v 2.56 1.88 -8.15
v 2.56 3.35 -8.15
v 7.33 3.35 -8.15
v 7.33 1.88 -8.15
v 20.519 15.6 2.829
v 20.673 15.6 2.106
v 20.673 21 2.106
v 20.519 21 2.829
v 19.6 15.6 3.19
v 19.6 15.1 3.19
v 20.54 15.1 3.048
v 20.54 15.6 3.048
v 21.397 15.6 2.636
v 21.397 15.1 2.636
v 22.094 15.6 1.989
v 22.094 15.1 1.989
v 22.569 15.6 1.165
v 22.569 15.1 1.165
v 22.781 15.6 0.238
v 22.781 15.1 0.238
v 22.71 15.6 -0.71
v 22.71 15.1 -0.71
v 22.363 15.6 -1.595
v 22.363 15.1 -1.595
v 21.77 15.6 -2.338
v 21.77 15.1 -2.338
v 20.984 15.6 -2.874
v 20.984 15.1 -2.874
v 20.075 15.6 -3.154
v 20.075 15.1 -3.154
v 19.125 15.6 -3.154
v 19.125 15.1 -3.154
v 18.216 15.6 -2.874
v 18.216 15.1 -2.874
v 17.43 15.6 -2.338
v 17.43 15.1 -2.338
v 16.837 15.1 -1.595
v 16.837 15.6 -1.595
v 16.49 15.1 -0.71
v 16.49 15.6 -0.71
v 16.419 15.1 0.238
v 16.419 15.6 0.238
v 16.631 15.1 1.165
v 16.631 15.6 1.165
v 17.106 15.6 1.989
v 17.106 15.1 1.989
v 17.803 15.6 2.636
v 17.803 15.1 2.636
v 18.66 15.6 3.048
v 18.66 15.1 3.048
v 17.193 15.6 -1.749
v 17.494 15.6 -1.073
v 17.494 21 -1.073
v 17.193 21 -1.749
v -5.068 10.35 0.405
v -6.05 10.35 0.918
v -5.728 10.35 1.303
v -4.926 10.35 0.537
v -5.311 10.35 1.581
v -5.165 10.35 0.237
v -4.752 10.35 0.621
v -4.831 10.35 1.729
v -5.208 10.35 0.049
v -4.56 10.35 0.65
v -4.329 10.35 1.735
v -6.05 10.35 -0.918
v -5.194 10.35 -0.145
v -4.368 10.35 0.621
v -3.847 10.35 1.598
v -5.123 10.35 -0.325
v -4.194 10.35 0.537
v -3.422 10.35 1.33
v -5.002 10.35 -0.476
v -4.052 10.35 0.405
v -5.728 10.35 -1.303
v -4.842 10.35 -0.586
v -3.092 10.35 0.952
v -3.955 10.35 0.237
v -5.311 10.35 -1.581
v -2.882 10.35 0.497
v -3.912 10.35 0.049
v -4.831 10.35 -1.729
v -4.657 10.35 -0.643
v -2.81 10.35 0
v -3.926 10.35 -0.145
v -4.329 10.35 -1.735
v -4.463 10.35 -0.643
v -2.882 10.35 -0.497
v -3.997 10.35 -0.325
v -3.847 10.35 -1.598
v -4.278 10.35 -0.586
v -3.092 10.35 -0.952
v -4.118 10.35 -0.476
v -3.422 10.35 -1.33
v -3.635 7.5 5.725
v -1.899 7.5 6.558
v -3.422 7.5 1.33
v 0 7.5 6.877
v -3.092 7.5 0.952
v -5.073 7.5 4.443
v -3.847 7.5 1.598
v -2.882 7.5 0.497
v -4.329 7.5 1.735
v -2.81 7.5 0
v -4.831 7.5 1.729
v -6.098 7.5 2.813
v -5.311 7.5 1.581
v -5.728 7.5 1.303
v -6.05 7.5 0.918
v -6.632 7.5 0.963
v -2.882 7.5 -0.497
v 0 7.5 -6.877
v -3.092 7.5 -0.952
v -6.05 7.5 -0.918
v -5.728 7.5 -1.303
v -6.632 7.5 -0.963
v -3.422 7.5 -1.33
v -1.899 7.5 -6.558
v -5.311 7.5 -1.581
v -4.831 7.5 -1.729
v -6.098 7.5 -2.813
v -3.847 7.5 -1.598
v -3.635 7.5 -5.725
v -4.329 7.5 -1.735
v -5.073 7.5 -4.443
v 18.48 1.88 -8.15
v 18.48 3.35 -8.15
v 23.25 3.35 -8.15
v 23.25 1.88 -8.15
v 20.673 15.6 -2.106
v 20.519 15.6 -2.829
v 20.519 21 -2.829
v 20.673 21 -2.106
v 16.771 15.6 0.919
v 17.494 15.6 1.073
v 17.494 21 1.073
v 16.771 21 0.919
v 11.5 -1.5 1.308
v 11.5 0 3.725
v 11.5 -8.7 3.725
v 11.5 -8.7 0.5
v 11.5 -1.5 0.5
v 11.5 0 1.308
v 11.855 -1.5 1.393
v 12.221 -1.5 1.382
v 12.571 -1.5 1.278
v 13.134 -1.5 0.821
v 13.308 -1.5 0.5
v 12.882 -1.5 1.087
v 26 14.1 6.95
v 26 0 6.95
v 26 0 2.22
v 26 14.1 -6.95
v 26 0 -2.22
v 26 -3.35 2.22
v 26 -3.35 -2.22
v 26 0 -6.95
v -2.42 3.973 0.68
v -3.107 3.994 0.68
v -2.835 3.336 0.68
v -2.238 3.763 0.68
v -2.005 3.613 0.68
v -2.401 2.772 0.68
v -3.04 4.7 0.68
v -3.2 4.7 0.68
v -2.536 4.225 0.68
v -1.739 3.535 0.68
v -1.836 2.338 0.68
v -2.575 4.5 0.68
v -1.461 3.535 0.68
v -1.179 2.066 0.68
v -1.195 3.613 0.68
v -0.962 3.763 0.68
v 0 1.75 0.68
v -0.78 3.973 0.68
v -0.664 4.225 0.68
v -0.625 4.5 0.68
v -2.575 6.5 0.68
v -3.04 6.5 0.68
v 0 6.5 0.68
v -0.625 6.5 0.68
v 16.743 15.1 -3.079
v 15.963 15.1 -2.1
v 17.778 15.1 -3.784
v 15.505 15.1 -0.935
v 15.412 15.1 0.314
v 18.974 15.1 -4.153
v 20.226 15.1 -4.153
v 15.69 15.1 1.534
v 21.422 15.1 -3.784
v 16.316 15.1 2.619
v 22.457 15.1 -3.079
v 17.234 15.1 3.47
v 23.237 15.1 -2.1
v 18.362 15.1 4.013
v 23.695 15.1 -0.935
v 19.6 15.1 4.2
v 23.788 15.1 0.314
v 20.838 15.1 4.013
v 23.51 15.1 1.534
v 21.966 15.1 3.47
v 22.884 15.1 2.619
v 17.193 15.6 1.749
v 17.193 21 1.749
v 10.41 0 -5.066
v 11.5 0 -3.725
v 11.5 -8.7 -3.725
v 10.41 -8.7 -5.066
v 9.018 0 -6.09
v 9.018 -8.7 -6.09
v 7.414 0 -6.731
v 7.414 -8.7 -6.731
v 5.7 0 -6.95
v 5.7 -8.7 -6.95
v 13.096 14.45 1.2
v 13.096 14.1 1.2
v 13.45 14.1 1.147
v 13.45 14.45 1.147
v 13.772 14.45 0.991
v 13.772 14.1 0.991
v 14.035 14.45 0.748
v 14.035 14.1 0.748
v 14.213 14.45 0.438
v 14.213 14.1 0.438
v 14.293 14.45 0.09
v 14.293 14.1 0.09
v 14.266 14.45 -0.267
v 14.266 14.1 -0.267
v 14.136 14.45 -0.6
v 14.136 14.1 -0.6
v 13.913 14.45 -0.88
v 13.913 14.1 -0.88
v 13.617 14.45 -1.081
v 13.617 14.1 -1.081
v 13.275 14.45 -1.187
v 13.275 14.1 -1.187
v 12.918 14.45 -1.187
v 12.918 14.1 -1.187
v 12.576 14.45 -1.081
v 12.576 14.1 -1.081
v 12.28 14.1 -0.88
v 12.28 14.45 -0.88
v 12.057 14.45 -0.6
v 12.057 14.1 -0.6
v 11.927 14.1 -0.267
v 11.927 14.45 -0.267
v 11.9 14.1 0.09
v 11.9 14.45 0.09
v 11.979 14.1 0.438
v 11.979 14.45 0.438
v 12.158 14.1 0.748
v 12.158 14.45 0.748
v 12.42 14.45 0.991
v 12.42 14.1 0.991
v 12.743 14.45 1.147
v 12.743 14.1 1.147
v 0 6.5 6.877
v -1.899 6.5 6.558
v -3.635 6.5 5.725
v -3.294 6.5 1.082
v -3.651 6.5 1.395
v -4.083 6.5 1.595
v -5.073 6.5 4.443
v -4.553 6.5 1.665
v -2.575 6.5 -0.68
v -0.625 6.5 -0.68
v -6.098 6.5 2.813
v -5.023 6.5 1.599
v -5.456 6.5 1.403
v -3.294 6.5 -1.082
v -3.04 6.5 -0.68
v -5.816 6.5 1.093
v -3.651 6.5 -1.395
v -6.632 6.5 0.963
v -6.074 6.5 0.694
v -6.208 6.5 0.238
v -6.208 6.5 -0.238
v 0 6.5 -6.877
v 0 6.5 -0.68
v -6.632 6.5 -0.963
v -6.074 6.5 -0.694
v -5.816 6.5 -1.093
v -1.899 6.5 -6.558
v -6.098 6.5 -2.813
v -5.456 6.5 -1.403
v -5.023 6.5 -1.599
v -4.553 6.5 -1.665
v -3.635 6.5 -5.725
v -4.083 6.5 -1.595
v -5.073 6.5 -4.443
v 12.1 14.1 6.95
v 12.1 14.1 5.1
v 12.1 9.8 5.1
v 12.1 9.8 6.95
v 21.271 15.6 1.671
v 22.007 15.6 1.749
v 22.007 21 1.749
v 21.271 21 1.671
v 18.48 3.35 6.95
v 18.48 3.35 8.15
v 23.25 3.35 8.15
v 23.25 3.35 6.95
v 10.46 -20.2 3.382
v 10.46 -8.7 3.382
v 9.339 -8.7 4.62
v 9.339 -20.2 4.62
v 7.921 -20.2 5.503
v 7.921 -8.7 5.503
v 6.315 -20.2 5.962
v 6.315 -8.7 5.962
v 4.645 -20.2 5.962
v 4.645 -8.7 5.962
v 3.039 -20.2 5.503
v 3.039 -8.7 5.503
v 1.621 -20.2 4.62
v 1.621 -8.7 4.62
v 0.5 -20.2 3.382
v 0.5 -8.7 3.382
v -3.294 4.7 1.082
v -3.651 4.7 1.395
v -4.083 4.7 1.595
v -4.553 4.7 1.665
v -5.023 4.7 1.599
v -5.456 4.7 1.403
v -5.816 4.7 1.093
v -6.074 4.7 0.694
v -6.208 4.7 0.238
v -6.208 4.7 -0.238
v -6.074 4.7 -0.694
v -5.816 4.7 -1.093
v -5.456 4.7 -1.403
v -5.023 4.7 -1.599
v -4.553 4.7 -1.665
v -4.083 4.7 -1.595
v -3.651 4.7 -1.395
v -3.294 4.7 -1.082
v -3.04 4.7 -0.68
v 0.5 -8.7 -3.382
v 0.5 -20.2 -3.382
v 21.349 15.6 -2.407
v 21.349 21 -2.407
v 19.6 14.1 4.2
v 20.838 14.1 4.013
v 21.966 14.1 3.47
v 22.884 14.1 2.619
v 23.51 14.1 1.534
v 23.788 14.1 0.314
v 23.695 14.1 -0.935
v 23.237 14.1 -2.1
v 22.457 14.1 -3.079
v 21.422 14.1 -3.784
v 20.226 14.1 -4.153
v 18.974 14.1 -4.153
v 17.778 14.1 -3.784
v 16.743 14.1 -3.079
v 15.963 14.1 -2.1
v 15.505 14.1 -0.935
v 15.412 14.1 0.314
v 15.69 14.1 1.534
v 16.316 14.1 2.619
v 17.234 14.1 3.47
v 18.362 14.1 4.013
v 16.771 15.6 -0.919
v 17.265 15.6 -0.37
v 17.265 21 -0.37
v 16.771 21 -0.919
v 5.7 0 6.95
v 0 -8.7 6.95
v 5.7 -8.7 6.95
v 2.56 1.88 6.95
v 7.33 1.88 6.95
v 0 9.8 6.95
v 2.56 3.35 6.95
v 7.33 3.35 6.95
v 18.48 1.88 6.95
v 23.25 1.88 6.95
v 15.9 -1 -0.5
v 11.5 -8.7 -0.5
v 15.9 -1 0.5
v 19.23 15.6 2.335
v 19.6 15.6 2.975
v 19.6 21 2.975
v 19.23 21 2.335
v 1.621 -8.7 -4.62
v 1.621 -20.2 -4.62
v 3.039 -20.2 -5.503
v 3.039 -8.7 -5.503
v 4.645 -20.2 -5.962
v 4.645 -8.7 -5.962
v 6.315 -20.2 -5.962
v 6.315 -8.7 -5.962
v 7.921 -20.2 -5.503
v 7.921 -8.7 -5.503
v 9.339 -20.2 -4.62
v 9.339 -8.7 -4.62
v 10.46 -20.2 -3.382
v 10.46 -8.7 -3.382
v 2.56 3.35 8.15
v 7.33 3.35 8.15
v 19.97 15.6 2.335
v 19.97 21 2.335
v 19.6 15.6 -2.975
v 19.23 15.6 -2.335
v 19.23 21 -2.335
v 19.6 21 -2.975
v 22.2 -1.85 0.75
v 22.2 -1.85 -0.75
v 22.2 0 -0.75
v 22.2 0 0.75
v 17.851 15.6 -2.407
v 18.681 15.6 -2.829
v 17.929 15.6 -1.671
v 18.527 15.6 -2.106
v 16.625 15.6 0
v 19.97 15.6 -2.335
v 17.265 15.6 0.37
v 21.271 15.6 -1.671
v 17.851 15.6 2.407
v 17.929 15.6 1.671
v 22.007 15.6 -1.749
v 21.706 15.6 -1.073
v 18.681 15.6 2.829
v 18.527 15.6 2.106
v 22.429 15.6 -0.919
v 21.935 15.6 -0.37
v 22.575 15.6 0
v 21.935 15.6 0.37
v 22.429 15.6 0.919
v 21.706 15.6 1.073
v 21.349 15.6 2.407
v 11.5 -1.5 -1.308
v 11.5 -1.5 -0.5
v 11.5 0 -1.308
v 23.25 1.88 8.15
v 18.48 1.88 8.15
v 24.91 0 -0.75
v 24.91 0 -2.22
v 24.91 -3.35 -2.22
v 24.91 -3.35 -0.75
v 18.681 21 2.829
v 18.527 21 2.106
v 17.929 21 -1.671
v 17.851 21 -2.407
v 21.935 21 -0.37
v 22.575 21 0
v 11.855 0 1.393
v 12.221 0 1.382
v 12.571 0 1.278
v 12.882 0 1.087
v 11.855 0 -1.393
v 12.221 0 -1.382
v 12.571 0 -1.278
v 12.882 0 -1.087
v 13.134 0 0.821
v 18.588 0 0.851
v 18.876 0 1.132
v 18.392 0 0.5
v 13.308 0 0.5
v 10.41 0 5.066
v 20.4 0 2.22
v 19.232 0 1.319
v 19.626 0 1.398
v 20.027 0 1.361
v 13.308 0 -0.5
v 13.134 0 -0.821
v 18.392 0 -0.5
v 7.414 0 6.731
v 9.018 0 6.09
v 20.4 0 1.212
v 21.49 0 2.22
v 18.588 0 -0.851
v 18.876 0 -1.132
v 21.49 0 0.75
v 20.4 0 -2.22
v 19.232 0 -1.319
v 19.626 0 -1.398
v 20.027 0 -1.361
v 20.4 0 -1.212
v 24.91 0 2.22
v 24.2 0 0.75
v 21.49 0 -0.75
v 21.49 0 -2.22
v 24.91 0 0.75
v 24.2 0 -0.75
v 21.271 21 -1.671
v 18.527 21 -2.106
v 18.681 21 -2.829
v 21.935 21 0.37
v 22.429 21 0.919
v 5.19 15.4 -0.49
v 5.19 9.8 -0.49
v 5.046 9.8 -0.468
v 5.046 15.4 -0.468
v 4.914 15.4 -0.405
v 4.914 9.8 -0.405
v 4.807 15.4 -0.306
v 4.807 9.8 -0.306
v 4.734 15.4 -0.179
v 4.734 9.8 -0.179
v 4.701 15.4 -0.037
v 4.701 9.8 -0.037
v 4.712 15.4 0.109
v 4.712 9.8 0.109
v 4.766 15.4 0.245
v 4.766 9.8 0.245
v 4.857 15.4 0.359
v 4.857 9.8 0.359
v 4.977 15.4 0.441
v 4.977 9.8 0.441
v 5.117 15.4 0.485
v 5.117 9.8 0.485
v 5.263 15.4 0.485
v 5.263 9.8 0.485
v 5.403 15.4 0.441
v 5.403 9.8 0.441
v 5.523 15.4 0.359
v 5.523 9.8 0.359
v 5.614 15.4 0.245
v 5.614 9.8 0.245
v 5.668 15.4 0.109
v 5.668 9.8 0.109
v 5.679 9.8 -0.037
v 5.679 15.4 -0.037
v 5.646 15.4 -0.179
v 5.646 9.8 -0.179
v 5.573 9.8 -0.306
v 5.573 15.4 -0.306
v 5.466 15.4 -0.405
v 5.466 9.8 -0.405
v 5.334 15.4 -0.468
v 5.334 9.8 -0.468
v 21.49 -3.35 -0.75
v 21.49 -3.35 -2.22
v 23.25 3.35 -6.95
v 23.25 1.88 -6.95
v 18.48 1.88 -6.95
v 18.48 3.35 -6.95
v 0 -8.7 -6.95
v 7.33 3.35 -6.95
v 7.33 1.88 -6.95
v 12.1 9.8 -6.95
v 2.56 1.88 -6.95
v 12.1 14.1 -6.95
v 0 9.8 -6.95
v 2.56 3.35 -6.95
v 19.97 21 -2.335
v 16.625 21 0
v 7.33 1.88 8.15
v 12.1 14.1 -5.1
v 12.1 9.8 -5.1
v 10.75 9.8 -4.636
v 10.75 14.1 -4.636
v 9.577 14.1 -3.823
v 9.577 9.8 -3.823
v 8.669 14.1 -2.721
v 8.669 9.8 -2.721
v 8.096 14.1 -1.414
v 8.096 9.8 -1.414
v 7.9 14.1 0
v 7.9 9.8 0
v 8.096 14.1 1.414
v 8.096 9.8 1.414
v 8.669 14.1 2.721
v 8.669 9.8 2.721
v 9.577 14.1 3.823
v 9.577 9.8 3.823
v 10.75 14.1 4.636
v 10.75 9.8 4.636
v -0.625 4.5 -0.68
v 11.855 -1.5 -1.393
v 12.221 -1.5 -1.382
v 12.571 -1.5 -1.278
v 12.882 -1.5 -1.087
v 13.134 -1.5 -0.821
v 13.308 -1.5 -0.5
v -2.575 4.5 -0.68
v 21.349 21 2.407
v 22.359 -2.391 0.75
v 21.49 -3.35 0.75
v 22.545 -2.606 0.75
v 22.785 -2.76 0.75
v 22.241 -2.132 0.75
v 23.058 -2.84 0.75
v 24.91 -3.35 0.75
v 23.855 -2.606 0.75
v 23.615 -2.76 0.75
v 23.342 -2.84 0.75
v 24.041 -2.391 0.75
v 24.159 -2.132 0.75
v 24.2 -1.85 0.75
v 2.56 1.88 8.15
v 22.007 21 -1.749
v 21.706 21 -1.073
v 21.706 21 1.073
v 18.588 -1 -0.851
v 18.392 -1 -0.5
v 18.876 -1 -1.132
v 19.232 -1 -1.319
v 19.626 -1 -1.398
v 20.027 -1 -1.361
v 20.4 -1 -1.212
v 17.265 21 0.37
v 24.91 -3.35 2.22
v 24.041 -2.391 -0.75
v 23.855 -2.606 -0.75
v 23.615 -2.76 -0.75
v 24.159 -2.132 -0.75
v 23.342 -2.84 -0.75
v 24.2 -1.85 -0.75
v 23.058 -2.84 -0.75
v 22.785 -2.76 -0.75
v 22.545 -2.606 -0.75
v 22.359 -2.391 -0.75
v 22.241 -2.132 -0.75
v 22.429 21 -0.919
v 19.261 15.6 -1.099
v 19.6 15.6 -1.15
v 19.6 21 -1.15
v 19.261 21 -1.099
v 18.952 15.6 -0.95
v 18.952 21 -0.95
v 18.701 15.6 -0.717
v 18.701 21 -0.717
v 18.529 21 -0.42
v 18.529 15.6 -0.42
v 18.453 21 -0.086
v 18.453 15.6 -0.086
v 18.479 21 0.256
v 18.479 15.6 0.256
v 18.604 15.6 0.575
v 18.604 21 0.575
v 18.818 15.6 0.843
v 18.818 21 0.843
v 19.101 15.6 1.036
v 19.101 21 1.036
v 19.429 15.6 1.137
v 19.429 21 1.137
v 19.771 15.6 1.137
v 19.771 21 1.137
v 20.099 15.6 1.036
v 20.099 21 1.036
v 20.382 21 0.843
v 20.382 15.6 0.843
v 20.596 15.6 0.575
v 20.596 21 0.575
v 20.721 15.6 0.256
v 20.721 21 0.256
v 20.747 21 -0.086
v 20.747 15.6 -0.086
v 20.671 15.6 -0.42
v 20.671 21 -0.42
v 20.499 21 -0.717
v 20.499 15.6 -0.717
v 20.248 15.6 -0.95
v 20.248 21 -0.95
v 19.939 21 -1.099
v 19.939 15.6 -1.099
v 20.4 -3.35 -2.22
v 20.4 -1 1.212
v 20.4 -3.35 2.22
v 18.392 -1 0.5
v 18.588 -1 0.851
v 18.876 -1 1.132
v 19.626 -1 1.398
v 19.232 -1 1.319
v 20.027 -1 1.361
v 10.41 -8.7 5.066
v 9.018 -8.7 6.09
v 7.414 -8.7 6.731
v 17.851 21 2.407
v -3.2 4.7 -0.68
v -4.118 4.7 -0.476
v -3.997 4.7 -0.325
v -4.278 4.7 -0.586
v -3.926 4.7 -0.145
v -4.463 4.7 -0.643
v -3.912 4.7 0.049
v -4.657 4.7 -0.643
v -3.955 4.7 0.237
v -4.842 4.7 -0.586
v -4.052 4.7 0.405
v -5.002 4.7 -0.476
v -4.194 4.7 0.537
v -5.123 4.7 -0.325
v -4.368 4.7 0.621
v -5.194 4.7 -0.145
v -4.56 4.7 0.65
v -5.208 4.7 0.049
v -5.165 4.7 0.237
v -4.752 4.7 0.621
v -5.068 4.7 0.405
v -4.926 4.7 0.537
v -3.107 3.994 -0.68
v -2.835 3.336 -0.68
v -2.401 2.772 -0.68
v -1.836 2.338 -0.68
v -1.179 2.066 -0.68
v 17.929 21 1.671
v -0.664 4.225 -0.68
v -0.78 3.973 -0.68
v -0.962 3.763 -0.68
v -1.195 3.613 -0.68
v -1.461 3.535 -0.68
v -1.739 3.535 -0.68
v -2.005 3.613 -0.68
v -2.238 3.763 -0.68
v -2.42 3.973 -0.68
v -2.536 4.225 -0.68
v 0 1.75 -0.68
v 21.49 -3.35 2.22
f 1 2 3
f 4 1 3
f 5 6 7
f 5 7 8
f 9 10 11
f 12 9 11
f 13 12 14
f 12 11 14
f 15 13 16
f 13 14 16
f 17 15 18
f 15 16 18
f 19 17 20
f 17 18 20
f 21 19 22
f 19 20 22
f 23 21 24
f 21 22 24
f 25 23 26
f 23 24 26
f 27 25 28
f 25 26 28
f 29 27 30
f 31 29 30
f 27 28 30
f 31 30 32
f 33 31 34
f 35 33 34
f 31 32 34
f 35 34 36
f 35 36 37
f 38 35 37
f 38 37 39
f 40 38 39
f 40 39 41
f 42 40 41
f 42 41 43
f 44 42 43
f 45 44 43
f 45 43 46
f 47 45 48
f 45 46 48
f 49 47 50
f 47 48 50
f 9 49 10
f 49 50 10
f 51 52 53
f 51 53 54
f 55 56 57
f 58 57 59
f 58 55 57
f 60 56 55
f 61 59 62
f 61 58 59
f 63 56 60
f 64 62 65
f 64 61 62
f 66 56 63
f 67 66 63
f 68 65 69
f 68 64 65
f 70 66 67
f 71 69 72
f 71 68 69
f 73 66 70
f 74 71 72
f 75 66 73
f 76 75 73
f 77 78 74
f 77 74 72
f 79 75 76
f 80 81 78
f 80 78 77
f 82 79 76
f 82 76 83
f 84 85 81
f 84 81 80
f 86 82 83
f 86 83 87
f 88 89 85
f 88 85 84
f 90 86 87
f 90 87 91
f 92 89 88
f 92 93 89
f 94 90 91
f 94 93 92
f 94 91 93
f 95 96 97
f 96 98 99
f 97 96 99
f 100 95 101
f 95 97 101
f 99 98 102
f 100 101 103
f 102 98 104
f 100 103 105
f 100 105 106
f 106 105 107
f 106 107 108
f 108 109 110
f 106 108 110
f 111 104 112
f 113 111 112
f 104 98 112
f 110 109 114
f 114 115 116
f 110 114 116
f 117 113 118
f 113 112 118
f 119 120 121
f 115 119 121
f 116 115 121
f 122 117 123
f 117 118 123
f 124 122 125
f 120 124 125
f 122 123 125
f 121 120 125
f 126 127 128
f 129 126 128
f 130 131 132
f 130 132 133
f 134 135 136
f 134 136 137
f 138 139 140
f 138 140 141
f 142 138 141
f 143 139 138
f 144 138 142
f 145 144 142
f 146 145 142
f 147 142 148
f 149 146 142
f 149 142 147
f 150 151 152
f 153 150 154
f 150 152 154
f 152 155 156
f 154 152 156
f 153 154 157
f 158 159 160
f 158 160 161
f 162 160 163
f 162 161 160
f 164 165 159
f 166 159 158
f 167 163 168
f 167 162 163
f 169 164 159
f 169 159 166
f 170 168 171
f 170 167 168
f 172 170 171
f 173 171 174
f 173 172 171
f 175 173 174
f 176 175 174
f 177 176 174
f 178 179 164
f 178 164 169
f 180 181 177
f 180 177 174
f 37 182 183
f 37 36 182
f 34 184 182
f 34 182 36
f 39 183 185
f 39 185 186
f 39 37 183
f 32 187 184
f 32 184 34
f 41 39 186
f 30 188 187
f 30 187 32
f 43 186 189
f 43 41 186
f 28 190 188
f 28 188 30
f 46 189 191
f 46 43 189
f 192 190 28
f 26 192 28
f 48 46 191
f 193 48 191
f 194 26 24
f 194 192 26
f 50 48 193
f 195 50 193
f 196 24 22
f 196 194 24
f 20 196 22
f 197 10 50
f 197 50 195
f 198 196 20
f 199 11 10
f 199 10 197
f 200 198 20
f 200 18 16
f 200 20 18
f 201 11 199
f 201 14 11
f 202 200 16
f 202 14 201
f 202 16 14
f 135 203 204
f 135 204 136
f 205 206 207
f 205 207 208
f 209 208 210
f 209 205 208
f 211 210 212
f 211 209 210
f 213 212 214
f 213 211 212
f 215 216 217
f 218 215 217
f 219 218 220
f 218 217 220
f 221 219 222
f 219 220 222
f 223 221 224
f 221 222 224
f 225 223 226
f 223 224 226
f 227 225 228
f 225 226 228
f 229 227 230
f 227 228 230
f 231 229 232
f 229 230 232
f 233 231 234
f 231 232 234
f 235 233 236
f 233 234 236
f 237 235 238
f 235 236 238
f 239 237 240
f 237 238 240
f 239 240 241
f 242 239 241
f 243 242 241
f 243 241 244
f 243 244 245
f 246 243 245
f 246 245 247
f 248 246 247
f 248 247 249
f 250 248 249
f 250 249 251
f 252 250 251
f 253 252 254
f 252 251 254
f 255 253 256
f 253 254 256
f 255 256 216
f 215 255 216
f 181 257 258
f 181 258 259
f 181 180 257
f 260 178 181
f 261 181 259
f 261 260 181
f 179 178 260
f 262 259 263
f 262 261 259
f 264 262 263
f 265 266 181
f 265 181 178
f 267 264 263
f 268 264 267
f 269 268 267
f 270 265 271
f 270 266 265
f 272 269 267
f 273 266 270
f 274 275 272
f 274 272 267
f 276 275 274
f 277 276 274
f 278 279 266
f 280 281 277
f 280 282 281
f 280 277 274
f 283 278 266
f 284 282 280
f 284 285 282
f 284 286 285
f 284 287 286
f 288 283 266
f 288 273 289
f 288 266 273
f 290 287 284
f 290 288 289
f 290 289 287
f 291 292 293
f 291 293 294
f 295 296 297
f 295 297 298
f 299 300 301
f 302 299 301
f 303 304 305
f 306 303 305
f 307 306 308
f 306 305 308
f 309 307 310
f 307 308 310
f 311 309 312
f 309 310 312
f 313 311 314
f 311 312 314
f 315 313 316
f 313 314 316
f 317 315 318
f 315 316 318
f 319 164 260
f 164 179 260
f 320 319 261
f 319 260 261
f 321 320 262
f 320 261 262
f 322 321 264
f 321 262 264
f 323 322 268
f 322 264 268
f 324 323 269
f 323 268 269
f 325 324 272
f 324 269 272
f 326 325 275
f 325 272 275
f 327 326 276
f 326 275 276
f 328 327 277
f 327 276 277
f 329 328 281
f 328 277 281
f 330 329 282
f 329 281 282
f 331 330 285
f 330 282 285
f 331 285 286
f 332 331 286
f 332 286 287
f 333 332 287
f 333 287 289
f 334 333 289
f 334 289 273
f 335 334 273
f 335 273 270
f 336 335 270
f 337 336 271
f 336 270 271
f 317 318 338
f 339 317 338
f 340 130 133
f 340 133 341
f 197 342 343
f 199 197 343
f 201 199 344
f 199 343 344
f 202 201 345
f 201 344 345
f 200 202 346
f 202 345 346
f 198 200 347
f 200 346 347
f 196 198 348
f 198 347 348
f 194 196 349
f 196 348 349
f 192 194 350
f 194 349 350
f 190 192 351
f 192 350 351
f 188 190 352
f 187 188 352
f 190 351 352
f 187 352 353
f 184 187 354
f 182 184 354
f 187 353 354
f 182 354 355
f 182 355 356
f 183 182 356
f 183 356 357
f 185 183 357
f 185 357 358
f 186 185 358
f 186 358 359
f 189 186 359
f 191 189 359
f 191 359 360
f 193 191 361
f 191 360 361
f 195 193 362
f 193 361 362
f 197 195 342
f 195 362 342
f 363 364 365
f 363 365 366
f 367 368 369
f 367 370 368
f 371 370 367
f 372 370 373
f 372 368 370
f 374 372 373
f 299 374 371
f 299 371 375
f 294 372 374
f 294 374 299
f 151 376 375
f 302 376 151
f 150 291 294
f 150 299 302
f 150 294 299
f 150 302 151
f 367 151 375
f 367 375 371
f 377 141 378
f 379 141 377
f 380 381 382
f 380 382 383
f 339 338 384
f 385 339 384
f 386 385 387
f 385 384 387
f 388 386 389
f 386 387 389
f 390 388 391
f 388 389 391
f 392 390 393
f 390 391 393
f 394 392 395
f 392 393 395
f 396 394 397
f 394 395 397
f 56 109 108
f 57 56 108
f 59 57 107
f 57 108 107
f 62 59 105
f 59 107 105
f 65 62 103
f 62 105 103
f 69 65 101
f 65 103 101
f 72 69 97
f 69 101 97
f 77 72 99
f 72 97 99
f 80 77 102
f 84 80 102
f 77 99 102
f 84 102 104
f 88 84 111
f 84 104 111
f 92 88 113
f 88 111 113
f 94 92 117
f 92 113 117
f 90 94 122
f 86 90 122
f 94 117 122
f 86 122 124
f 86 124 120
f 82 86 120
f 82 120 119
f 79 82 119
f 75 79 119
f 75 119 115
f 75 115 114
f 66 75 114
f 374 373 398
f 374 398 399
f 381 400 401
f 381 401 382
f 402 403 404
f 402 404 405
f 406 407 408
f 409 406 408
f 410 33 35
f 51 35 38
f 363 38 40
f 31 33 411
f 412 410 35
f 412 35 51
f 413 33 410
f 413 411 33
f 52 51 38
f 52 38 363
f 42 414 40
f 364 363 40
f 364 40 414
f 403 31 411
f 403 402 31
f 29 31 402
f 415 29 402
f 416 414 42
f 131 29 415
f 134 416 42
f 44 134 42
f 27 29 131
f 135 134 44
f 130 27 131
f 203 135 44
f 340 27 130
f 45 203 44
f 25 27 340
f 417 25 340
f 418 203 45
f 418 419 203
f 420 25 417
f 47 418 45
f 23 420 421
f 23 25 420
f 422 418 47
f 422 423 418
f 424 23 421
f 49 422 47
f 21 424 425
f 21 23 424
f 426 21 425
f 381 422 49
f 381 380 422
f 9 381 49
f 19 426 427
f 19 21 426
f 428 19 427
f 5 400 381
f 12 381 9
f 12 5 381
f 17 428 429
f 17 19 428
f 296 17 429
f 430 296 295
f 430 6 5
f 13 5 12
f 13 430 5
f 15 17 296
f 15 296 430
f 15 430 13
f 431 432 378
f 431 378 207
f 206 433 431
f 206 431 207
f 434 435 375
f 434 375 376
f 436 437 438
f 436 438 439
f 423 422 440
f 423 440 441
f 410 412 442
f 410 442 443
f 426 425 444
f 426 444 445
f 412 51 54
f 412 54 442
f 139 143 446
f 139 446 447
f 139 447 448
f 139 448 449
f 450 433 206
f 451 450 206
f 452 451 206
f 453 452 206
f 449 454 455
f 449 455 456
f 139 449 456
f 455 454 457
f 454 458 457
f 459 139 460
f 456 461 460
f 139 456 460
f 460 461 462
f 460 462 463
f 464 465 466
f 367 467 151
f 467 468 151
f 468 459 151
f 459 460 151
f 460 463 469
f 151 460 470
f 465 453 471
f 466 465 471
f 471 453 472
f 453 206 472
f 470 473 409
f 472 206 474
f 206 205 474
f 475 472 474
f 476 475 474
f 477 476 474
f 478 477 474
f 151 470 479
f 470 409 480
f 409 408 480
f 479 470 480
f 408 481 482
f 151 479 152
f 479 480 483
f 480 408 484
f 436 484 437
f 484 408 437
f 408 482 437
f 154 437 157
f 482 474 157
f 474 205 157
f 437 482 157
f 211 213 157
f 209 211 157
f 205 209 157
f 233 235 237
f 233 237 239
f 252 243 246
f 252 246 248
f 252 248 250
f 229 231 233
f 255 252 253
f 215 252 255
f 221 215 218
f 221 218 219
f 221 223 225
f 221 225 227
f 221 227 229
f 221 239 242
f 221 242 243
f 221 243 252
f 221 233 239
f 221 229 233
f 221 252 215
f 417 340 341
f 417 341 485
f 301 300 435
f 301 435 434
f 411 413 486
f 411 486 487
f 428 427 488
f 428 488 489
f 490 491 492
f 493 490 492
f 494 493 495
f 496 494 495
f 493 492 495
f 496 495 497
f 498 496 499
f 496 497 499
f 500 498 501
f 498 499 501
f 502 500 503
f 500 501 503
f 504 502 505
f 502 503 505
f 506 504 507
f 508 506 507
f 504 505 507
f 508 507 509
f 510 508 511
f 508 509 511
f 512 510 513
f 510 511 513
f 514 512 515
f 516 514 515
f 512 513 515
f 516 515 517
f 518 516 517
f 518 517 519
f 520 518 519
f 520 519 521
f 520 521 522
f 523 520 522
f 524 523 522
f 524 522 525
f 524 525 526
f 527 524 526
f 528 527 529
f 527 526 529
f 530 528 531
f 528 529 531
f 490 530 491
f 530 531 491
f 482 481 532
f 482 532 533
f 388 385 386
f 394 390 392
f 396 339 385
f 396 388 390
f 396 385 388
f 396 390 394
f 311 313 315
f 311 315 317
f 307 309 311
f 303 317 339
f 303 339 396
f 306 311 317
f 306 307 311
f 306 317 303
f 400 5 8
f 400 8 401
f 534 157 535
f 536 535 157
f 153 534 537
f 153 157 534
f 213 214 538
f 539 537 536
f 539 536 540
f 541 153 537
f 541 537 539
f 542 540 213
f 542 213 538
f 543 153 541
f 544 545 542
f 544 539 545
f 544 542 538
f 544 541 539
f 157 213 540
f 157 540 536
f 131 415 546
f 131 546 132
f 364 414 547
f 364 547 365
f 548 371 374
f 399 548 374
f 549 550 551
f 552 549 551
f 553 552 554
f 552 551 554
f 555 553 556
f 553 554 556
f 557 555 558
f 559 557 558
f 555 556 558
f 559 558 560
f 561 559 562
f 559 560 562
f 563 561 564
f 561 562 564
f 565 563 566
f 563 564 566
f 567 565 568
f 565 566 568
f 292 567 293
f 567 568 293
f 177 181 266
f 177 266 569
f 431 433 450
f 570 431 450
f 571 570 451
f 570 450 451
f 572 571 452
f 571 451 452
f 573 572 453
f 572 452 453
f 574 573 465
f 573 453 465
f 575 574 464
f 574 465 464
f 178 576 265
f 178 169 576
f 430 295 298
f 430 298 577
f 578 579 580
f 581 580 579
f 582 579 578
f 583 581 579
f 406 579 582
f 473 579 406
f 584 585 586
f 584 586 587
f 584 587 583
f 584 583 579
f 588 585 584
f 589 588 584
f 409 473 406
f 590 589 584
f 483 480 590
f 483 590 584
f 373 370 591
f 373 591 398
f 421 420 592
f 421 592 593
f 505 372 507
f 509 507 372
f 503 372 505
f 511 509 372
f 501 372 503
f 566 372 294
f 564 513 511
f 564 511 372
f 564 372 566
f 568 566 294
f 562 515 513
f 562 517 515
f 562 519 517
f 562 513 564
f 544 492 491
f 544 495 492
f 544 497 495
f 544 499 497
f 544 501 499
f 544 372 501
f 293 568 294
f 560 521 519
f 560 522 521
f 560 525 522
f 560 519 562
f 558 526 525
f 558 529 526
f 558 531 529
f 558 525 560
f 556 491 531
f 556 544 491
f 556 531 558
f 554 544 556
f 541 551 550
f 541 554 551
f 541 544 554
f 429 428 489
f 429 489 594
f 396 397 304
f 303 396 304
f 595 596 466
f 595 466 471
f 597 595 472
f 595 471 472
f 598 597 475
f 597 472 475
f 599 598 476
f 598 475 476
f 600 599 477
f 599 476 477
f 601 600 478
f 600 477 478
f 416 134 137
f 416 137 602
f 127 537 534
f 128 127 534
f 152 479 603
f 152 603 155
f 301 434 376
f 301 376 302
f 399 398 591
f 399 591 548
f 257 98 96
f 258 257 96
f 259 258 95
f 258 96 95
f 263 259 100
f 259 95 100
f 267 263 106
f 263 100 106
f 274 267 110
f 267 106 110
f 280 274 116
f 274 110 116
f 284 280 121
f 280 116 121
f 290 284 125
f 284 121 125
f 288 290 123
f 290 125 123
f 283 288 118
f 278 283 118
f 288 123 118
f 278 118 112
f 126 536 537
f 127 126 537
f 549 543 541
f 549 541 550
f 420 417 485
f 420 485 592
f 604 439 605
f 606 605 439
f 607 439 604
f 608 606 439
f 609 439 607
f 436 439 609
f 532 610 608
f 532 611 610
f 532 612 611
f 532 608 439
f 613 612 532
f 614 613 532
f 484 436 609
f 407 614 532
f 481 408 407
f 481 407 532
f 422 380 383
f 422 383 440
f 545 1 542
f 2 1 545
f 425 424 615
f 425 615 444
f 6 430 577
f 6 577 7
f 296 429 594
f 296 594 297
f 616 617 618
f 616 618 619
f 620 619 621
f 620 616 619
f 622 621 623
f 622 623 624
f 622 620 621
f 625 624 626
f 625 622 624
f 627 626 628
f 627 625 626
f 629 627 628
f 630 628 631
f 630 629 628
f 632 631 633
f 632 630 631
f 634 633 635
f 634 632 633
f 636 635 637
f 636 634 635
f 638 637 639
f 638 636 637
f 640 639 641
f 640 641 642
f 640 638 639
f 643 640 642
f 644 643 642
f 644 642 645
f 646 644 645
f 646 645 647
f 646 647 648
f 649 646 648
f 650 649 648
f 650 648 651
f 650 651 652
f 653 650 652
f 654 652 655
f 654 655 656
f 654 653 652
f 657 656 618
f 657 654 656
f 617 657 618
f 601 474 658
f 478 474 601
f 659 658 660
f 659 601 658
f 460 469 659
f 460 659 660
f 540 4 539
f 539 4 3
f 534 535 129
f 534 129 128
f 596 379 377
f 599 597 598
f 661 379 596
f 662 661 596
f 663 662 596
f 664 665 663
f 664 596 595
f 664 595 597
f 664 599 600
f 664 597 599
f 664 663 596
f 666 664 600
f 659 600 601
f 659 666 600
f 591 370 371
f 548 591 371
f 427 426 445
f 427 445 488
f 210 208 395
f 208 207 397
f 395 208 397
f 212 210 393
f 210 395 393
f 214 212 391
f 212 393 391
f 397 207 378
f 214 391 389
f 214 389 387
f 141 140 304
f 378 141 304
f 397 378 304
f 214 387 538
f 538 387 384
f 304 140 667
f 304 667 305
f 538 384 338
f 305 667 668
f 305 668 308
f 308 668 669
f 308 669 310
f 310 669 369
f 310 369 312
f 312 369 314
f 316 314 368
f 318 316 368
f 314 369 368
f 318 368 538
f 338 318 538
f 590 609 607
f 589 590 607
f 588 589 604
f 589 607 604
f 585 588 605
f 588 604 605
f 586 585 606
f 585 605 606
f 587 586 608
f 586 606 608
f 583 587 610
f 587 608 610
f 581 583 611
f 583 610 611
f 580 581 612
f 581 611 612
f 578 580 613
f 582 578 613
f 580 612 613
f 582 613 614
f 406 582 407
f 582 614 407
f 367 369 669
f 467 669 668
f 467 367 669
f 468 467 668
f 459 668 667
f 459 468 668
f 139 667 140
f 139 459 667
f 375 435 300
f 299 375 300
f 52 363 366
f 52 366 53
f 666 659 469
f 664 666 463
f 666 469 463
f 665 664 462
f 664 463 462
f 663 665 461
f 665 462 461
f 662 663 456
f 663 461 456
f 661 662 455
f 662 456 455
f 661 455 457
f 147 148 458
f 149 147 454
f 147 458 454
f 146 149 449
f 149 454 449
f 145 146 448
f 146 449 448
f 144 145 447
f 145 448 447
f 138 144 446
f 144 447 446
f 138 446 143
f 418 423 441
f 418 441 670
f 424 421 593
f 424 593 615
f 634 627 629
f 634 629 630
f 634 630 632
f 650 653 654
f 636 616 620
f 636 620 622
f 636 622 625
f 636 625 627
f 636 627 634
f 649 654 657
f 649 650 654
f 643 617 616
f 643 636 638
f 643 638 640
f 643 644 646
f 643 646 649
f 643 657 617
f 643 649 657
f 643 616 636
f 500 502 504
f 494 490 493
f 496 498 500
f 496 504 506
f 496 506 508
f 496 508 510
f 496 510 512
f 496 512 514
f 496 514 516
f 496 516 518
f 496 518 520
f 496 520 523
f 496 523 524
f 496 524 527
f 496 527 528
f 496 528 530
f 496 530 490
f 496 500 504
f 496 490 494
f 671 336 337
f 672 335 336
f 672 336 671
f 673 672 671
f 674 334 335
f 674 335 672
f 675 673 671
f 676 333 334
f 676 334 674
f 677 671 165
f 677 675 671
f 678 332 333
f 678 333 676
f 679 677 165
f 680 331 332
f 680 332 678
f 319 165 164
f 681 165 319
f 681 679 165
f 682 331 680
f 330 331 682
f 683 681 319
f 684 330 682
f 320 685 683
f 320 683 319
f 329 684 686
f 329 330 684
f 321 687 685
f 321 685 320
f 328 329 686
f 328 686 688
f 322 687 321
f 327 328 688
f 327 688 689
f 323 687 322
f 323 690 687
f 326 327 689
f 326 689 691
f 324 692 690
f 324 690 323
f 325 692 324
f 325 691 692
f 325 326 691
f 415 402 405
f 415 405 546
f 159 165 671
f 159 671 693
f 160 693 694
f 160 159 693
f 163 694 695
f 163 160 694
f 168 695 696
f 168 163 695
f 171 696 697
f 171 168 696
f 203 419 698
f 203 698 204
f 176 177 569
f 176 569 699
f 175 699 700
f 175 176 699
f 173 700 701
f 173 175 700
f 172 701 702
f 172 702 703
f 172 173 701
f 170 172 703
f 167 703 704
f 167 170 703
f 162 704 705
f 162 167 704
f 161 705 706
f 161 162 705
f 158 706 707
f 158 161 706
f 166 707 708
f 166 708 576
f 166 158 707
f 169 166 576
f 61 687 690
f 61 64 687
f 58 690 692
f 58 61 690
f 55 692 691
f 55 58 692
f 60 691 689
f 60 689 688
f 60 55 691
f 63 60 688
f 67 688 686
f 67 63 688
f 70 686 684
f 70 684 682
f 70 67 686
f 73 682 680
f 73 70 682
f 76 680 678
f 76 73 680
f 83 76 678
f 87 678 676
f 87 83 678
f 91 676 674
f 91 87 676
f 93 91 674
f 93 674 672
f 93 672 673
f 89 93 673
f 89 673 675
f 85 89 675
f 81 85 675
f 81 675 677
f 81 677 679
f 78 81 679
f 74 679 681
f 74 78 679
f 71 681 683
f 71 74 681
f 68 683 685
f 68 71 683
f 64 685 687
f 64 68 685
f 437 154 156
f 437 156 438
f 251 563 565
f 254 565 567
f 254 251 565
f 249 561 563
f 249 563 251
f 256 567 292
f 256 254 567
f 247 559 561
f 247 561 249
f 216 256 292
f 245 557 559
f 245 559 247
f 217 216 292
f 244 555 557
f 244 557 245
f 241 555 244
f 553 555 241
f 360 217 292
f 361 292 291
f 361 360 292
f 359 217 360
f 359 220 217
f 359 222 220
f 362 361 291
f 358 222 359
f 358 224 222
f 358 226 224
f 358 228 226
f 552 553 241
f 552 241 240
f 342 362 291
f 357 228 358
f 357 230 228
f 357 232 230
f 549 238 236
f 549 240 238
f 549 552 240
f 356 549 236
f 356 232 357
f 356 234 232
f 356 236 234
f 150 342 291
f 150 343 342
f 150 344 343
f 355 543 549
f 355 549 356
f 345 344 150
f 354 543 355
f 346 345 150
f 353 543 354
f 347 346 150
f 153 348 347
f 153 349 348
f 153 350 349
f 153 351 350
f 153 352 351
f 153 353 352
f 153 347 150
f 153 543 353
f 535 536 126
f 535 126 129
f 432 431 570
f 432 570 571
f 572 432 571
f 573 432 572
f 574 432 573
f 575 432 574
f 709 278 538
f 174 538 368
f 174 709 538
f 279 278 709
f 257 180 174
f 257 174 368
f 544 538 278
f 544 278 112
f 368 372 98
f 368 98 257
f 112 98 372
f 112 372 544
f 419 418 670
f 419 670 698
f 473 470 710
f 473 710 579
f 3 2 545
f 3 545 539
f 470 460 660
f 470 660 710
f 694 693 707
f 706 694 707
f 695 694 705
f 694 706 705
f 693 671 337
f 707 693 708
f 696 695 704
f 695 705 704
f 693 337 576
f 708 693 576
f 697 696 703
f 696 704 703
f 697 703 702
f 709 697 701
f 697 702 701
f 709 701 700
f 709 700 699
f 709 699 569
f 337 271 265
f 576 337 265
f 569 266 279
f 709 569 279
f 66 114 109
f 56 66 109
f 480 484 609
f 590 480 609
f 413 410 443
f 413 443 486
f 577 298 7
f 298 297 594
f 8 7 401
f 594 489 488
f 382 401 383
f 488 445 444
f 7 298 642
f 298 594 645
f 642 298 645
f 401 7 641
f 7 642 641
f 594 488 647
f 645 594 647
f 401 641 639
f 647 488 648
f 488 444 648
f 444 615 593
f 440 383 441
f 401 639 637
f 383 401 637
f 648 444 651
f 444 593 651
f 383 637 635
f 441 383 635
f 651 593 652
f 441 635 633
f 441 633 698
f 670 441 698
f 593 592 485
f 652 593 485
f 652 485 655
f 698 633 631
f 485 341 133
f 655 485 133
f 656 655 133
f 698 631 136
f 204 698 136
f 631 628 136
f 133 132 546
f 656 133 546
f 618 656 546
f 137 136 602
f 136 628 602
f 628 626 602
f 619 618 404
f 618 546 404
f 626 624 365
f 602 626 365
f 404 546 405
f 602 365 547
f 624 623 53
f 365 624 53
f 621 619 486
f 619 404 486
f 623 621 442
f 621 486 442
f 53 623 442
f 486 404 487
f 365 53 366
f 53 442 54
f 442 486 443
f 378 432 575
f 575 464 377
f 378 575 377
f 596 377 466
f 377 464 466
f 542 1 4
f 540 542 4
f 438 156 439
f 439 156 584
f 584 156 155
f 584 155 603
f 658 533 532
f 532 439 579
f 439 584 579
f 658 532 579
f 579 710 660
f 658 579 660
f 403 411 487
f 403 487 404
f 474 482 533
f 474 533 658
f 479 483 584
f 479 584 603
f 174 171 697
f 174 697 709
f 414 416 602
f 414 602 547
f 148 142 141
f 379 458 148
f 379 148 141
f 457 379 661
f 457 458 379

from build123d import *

# Parameters (mm, degrees)
SKETCH1_W            = 26
SKETCH1_H            = 13.9
BOSS_EXTRUDE1_DEPTH  = 9.8
BOSS_EXTRUDE2_DEPTH  = 4.3
SKETCH4_R            = 4.2
BOSS_EXTRUDE3_DEPTH  = 1
SKETCH5_R            = 3.19
BOSS_EXTRUDE4_DEPTH  = 0.5
SKETCH6_R            = 1.15
BOSS_EXTRUDE5_DEPTH  = 5.4
SKETCH7_R            = 0.49
BOSS_EXTRUDE6_DEPTH  = 5.6
BOSS_EXTRUDE7_DEPTH  = 8.7
BOSS_EXTRUDE8_DEPTH  = 11.5
BOSS_EXTRUDE9_DEPTH  = 3.35
CUT_EXTRUDE1_DEPTH   = 35.297084424
BOSS_EXTRUDE10_START = -2.3
BOSS_EXTRUDE10_DEPTH = 1
BOSS_EXTRUDE11_DEPTH = 2.85
SKETCH15_R           = 0.65
CUT_EXTRUDE2_DEPTH   = 41.713695484
SKETCH14_R           = 1.665
SKETCH14_R_2         = 0.65
BOSS_EXTRUDE12_DEPTH = 1.8
BOSS_EXTRUDE13_DEPTH = 0.68
BOSS_EXTRUDE14_DEPTH = 0.5
SKETCH18_R           = 1.2
BOSS_EXTRUDE15_DEPTH = 0.35
SKETCH20_W           = 4.77
SKETCH20_H           = 1.47
BOSS_EXTRUDE16_DEPTH = 8.15
SKETCH21_R           = 1.4
BOSS_EXTRUDE17_DEPTH = 1
BOSS_EXTRUDE18_START = -1
SKETCH22_R           = 1.4
BOSS_EXTRUDE18_DEPTH = 1.5


with BuildPart() as part:
    # Sketch1 → Boss-Extrude1 (new body)
    with BuildSketch(Plane(origin=(0, 0, 0), x_dir=(1, 0, 0), z_dir=(0, 1, 0))):
        with Locations((13, 0)):
            Rectangle(SKETCH1_W, SKETCH1_H)
    extrude(amount=BOSS_EXTRUDE1_DEPTH)

    # Sketch2 → Boss-Extrude2 (add)
    with BuildSketch(Plane(origin=(0, 9.8, 0), x_dir=(1, 0, 0), z_dir=(0, 1, 0))):
        with BuildLine():
            Line((26, -6.95), (26, 6.95))
            Line((26, 6.95), (12.1, 6.95))
            Line((12.1, 6.95), (12.1, 5.1))
            ThreePointArc((12.1, 5.1), (7.9, 0), (12.1, -5.1))
            Line((12.1, -5.1), (12.1, -6.95))
            Line((12.1, -6.95), (26, -6.95))
        make_face()
    extrude(amount=BOSS_EXTRUDE2_DEPTH)

    # Sketch4 → Boss-Extrude3 (add)
    with BuildSketch(Plane(origin=(0, 14.1, 0), x_dir=(1, 0, 0), z_dir=(0, 1, 0))):
        with Locations(Location((19.6, 0, 0), (0, 0, 270))):
            Circle(SKETCH4_R)
    extrude(amount=BOSS_EXTRUDE3_DEPTH)

    # Sketch5 → Boss-Extrude4 (add)
    with BuildSketch(Plane(origin=(0, 15.1, 0), x_dir=(1, 0, 0), z_dir=(0, 1, 0))):
        with Locations(Location((19.6, 0, 0), (0, 0, 270))):
            Circle(SKETCH5_R)
    extrude(amount=BOSS_EXTRUDE4_DEPTH)

    # Sketch6 → Boss-Extrude5 (add)
    with BuildSketch(Plane(origin=(0, 15.6, 0), x_dir=(1, 0, 0), z_dir=(0, 1, 0))):
        Polygon((18.680674442, 2.829393136), (19.230241972, 2.334560309), (19.6, 2.975), (19.969758028, 2.334560309), (20.519325558, 2.829393136), (20.673079592, 2.10603728), (21.348661126, 2.406825558), (21.271360649, 1.671360649), (22.006825558, 1.748661126), (21.70603728, 1.073079592), (22.429393136, 0.919325558), (21.934560309, 0.369758028), (22.575, 0), (21.934560309, -0.369758028), (22.429393136, -0.919325558), (21.70603728, -1.073079592), (22.006825558, -1.748661126), (21.271360649, -1.671360649), (21.348661126, -2.406825558), (20.673079592, -2.10603728), (20.519325558, -2.829393136), (19.969758028, -2.334560309), (19.6, -2.975), (19.230241972, -2.334560309), (18.680674442, -2.829393136), (18.526920408, -2.10603728), (17.851338874, -2.406825558), (17.928639351, -1.671360649), (17.193174442, -1.748661126), (17.49396272, -1.073079592), (16.770606864, -0.919325558), (17.265439691, -0.369758028), (16.625, 0), (17.265439691, 0.369758028), (16.770606864, 0.919325558), (17.49396272, 1.073079592), (17.193174442, 1.748661126), (17.928639351, 1.671360649), (17.851338874, 2.406825558), (18.526920408, 2.10603728), align=None)
        with Locations(Location((19.6, 0, 0), (0, 0, 90))):
            Circle(SKETCH6_R, mode=Mode.SUBTRACT)
    extrude(amount=BOSS_EXTRUDE5_DEPTH)

    # Sketch7 → Boss-Extrude6 (add)
    with BuildSketch(Plane(origin=(0, 9.8, 0), x_dir=(1, 0, 0), z_dir=(0, 1, 0))):
        with Locations(Location((5.19, 0, 0), (0, 0, 90))):
            Circle(SKETCH7_R)
    extrude(amount=BOSS_EXTRUDE6_DEPTH)

    # Sketch8 → Boss-Extrude7 (add)
    with BuildSketch(Plane.XZ):
        with BuildLine():
            Line((11.5, 3.725), (11.5, -3.725))
            ThreePointArc((11.5, -3.725), (9.018155549, -6.089531686), (5.7, -6.95))
            Line((5.7, -6.95), (0, -6.95))
            Line((0, -6.95), (0, 6.95))
            Line((0, 6.95), (5.7, 6.95))
            ThreePointArc((5.7, 6.95), (9.018155549, 6.089531686), (11.5, 3.725))
        make_face()
    extrude(amount=BOSS_EXTRUDE7_DEPTH)

    # Sketch9 → Boss-Extrude8 (add)
    with BuildSketch(Plane.XZ.offset(8.7)):
        with BuildLine():
            Line((0.5, 3.382306905), (0.5, -3.382306905))
            ThreePointArc((0.5, -3.382306905), (5.48, -6.02), (10.46, -3.382306905))
            Line((10.46, -3.382306905), (10.46, 3.382306905))
            ThreePointArc((10.46, 3.382306905), (5.48, 6.02), (0.5, 3.382306905))
        make_face()
    extrude(amount=BOSS_EXTRUDE8_DEPTH)

    # Sketch10 → Boss-Extrude9 (add)
    with BuildSketch(Plane.XZ):
        Polygon((26, 2.22), (26, -2.22), (24.91, -2.22), (24.91, -0.75), (21.49, -0.75), (21.49, -2.22), (20.4, -2.22), (20.4, 2.22), (21.49, 2.22), (21.49, 0.75), (24.91, 0.75), (24.91, 2.22), align=None)
    extrude(amount=BOSS_EXTRUDE9_DEPTH)

    # Sketch11 → Cut-Extrude1 (cut, through all)
    with BuildSketch(Plane(origin=(0, 0, -0.75), x_dir=(-1, 0, 0), z_dir=(0, 0, -1))):
        with BuildLine():
            Line((-24.2, 0), (-24.2, -1.85))
            ThreePointArc((-24.2, -1.85), (-23.2, -2.85), (-22.2, -1.85))
            Line((-22.2, -1.85), (-22.2, 0))
            Line((-22.2, 0), (-24.2, 0))
        make_face()
    extrude(amount=-CUT_EXTRUDE1_DEPTH, mode=Mode.SUBTRACT)

    # Sketch12 → Boss-Extrude10 (add)
    with BuildSketch(Plane(origin=(0, 9.8, 0), x_dir=(1, 0, 0), z_dir=(0, 1, 0)).offset(BOSS_EXTRUDE10_START)):
        with BuildLine():
            Line((0, 6.876790543), (0, -6.876790543))
            ThreePointArc((0, -6.876790543), (-6.7, 0), (0, 6.876790543))
        make_face()
    extrude(amount=-BOSS_EXTRUDE10_DEPTH)

    # Sketch13 → Boss-Extrude11 (add)
    with BuildSketch(Plane(origin=(0, 7.5, 0), x_dir=(1, 0, 0), z_dir=(0, 1, 0))):
        with BuildLine():
            Line((-6.05, 0.917823512), (-6.05, -0.917823512))
            ThreePointArc((-6.05, -0.917823512), (-2.81, 0), (-6.05, 0.917823512))
        make_face()
    extrude(amount=BOSS_EXTRUDE11_DEPTH)

    # Sketch15 → Cut-Extrude2 (cut, through all)
    with BuildSketch(Plane(origin=(0, 10.35, 0), x_dir=(1, 0, 0), z_dir=(0, 1, 0))):
        with Locations(Location((-4.56, 0, 0), (0, 0, 270))):
            Circle(SKETCH15_R)
    extrude(amount=-CUT_EXTRUDE2_DEPTH, mode=Mode.SUBTRACT)

    # Sketch14 → Boss-Extrude12 (add)
    with BuildSketch(Plane.XZ.offset(-6.5)):
        with Locations(Location((-4.56, 0, 0), (0, 0, 90))):
            Circle(SKETCH14_R)
        with Locations(Location((-4.56, 0, 0), (0, 0, 90))):
            Circle(SKETCH14_R_2, mode=Mode.SUBTRACT)
    extrude(amount=BOSS_EXTRUDE12_DEPTH)

    # Sketch16 → Boss-Extrude13 (add, symmetric)
    with BuildSketch(Plane.XY):
        with BuildLine():
            Line((-3.2, 6.5), (-3.2, 4.7))
            ThreePointArc((-3.2, 4.7), (-2.636457892, 3.039858484), (-1.178739757, 2.065842366))
            Line((-1.178739757, 2.065842366), (0, 1.75))
            Line((0, 1.75), (0, 6.5))
            Line((0, 6.5), (-0.625, 6.5))
            Line((-0.625, 6.5), (-0.625, 4.5))
            ThreePointArc((-0.625, 4.5), (-1.6, 3.525), (-2.575, 4.5))
            Line((-2.575, 4.5), (-2.575, 6.5))
            Line((-2.575, 6.5), (-3.2, 6.5))
        make_face()
    extrude(amount=BOSS_EXTRUDE13_DEPTH, both=True)

    # Sketch17 → Boss-Extrude14 (add, symmetric)
    with BuildSketch(Plane.XY):
        Polygon((11.5, -8.7), (15.9, -1), (20.4, -1), (20.4, 0), (11.5, 0), align=None)
    extrude(amount=BOSS_EXTRUDE14_DEPTH, both=True)

    # Sketch18 → Boss-Extrude15 (add)
    with BuildSketch(Plane(origin=(0, 14.1, 0), x_dir=(1, 0, 0), z_dir=(0, 1, 0))):
        with Locations(Location((13.096428571, 0, 0), (0, 0, 270))):
            Circle(SKETCH18_R)
    extrude(amount=BOSS_EXTRUDE15_DEPTH)

    # Sketch20 → Boss-Extrude16 (add, symmetric)
    with BuildSketch(Plane.XY):
        with Locations((4.945, 2.615)):
            Rectangle(SKETCH20_W, SKETCH20_H)
        with Locations((20.865, 2.615)):
            Rectangle(SKETCH20_W, SKETCH20_H)
    extrude(amount=BOSS_EXTRUDE16_DEPTH, both=True)

    # Sketch21 → Boss-Extrude17 (add)
    with BuildSketch(Plane.XZ):
        with Locations((19.7, 0)):
            Circle(SKETCH21_R)
    extrude(amount=BOSS_EXTRUDE17_DEPTH)

    # Sketch22 → Boss-Extrude18 (add)
    with BuildSketch(Plane.XZ.offset(1).offset(BOSS_EXTRUDE18_START)):
        with Locations((12, 0)):
            Circle(SKETCH22_R)
    extrude(amount=BOSS_EXTRUDE18_DEPTH)


solid = part.part
